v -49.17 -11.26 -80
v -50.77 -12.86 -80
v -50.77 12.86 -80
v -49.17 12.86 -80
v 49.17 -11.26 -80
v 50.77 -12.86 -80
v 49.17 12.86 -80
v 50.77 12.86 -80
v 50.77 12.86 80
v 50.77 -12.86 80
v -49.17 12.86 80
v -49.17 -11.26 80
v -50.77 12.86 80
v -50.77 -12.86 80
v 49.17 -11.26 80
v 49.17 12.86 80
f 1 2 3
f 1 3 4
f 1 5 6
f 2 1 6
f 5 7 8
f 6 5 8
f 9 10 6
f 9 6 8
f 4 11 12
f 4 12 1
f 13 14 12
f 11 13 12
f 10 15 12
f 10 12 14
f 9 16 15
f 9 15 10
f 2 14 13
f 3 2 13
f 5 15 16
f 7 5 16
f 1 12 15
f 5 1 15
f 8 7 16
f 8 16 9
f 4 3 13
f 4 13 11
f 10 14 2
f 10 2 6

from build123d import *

# Parameters (mm, degrees)
CROQUIS1_W              = 101.54
CROQUIS1_H              = 25.72
CROQUIS1_W_2            = 98.34
CROQUIS1_H_2            = 22.52
SALIENTE_EXTRUIR1_DEPTH = 80
CROQUIS2_W              = 98.34
CROQUIS2_H              = 160
CORTAR_EXTRUIR1_DEPTH   = 11.1


with BuildPart() as part:
    # Croquis1 → Saliente-Extruir1 (new, symmetric)
    with BuildSketch(Plane.XY):
        Rectangle(CROQUIS1_W, CROQUIS1_H)
        Rectangle(CROQUIS1_W_2, CROQUIS1_H_2, mode=Mode.SUBTRACT)
    extrude(amount=SALIENTE_EXTRUIR1_DEPTH, both=True)

    # Croquis2 → Cortar-Extruir1 (cut)
    with BuildSketch(Plane(origin=(0, 12.86, 0), x_dir=(1, 0, 0), z_dir=(0, 1, 0))):
        Rectangle(CROQUIS2_W, CROQUIS2_H)
    extrude(amount=-CORTAR_EXTRUIR1_DEPTH, mode=Mode.SUBTRACT)


solid = part.part
